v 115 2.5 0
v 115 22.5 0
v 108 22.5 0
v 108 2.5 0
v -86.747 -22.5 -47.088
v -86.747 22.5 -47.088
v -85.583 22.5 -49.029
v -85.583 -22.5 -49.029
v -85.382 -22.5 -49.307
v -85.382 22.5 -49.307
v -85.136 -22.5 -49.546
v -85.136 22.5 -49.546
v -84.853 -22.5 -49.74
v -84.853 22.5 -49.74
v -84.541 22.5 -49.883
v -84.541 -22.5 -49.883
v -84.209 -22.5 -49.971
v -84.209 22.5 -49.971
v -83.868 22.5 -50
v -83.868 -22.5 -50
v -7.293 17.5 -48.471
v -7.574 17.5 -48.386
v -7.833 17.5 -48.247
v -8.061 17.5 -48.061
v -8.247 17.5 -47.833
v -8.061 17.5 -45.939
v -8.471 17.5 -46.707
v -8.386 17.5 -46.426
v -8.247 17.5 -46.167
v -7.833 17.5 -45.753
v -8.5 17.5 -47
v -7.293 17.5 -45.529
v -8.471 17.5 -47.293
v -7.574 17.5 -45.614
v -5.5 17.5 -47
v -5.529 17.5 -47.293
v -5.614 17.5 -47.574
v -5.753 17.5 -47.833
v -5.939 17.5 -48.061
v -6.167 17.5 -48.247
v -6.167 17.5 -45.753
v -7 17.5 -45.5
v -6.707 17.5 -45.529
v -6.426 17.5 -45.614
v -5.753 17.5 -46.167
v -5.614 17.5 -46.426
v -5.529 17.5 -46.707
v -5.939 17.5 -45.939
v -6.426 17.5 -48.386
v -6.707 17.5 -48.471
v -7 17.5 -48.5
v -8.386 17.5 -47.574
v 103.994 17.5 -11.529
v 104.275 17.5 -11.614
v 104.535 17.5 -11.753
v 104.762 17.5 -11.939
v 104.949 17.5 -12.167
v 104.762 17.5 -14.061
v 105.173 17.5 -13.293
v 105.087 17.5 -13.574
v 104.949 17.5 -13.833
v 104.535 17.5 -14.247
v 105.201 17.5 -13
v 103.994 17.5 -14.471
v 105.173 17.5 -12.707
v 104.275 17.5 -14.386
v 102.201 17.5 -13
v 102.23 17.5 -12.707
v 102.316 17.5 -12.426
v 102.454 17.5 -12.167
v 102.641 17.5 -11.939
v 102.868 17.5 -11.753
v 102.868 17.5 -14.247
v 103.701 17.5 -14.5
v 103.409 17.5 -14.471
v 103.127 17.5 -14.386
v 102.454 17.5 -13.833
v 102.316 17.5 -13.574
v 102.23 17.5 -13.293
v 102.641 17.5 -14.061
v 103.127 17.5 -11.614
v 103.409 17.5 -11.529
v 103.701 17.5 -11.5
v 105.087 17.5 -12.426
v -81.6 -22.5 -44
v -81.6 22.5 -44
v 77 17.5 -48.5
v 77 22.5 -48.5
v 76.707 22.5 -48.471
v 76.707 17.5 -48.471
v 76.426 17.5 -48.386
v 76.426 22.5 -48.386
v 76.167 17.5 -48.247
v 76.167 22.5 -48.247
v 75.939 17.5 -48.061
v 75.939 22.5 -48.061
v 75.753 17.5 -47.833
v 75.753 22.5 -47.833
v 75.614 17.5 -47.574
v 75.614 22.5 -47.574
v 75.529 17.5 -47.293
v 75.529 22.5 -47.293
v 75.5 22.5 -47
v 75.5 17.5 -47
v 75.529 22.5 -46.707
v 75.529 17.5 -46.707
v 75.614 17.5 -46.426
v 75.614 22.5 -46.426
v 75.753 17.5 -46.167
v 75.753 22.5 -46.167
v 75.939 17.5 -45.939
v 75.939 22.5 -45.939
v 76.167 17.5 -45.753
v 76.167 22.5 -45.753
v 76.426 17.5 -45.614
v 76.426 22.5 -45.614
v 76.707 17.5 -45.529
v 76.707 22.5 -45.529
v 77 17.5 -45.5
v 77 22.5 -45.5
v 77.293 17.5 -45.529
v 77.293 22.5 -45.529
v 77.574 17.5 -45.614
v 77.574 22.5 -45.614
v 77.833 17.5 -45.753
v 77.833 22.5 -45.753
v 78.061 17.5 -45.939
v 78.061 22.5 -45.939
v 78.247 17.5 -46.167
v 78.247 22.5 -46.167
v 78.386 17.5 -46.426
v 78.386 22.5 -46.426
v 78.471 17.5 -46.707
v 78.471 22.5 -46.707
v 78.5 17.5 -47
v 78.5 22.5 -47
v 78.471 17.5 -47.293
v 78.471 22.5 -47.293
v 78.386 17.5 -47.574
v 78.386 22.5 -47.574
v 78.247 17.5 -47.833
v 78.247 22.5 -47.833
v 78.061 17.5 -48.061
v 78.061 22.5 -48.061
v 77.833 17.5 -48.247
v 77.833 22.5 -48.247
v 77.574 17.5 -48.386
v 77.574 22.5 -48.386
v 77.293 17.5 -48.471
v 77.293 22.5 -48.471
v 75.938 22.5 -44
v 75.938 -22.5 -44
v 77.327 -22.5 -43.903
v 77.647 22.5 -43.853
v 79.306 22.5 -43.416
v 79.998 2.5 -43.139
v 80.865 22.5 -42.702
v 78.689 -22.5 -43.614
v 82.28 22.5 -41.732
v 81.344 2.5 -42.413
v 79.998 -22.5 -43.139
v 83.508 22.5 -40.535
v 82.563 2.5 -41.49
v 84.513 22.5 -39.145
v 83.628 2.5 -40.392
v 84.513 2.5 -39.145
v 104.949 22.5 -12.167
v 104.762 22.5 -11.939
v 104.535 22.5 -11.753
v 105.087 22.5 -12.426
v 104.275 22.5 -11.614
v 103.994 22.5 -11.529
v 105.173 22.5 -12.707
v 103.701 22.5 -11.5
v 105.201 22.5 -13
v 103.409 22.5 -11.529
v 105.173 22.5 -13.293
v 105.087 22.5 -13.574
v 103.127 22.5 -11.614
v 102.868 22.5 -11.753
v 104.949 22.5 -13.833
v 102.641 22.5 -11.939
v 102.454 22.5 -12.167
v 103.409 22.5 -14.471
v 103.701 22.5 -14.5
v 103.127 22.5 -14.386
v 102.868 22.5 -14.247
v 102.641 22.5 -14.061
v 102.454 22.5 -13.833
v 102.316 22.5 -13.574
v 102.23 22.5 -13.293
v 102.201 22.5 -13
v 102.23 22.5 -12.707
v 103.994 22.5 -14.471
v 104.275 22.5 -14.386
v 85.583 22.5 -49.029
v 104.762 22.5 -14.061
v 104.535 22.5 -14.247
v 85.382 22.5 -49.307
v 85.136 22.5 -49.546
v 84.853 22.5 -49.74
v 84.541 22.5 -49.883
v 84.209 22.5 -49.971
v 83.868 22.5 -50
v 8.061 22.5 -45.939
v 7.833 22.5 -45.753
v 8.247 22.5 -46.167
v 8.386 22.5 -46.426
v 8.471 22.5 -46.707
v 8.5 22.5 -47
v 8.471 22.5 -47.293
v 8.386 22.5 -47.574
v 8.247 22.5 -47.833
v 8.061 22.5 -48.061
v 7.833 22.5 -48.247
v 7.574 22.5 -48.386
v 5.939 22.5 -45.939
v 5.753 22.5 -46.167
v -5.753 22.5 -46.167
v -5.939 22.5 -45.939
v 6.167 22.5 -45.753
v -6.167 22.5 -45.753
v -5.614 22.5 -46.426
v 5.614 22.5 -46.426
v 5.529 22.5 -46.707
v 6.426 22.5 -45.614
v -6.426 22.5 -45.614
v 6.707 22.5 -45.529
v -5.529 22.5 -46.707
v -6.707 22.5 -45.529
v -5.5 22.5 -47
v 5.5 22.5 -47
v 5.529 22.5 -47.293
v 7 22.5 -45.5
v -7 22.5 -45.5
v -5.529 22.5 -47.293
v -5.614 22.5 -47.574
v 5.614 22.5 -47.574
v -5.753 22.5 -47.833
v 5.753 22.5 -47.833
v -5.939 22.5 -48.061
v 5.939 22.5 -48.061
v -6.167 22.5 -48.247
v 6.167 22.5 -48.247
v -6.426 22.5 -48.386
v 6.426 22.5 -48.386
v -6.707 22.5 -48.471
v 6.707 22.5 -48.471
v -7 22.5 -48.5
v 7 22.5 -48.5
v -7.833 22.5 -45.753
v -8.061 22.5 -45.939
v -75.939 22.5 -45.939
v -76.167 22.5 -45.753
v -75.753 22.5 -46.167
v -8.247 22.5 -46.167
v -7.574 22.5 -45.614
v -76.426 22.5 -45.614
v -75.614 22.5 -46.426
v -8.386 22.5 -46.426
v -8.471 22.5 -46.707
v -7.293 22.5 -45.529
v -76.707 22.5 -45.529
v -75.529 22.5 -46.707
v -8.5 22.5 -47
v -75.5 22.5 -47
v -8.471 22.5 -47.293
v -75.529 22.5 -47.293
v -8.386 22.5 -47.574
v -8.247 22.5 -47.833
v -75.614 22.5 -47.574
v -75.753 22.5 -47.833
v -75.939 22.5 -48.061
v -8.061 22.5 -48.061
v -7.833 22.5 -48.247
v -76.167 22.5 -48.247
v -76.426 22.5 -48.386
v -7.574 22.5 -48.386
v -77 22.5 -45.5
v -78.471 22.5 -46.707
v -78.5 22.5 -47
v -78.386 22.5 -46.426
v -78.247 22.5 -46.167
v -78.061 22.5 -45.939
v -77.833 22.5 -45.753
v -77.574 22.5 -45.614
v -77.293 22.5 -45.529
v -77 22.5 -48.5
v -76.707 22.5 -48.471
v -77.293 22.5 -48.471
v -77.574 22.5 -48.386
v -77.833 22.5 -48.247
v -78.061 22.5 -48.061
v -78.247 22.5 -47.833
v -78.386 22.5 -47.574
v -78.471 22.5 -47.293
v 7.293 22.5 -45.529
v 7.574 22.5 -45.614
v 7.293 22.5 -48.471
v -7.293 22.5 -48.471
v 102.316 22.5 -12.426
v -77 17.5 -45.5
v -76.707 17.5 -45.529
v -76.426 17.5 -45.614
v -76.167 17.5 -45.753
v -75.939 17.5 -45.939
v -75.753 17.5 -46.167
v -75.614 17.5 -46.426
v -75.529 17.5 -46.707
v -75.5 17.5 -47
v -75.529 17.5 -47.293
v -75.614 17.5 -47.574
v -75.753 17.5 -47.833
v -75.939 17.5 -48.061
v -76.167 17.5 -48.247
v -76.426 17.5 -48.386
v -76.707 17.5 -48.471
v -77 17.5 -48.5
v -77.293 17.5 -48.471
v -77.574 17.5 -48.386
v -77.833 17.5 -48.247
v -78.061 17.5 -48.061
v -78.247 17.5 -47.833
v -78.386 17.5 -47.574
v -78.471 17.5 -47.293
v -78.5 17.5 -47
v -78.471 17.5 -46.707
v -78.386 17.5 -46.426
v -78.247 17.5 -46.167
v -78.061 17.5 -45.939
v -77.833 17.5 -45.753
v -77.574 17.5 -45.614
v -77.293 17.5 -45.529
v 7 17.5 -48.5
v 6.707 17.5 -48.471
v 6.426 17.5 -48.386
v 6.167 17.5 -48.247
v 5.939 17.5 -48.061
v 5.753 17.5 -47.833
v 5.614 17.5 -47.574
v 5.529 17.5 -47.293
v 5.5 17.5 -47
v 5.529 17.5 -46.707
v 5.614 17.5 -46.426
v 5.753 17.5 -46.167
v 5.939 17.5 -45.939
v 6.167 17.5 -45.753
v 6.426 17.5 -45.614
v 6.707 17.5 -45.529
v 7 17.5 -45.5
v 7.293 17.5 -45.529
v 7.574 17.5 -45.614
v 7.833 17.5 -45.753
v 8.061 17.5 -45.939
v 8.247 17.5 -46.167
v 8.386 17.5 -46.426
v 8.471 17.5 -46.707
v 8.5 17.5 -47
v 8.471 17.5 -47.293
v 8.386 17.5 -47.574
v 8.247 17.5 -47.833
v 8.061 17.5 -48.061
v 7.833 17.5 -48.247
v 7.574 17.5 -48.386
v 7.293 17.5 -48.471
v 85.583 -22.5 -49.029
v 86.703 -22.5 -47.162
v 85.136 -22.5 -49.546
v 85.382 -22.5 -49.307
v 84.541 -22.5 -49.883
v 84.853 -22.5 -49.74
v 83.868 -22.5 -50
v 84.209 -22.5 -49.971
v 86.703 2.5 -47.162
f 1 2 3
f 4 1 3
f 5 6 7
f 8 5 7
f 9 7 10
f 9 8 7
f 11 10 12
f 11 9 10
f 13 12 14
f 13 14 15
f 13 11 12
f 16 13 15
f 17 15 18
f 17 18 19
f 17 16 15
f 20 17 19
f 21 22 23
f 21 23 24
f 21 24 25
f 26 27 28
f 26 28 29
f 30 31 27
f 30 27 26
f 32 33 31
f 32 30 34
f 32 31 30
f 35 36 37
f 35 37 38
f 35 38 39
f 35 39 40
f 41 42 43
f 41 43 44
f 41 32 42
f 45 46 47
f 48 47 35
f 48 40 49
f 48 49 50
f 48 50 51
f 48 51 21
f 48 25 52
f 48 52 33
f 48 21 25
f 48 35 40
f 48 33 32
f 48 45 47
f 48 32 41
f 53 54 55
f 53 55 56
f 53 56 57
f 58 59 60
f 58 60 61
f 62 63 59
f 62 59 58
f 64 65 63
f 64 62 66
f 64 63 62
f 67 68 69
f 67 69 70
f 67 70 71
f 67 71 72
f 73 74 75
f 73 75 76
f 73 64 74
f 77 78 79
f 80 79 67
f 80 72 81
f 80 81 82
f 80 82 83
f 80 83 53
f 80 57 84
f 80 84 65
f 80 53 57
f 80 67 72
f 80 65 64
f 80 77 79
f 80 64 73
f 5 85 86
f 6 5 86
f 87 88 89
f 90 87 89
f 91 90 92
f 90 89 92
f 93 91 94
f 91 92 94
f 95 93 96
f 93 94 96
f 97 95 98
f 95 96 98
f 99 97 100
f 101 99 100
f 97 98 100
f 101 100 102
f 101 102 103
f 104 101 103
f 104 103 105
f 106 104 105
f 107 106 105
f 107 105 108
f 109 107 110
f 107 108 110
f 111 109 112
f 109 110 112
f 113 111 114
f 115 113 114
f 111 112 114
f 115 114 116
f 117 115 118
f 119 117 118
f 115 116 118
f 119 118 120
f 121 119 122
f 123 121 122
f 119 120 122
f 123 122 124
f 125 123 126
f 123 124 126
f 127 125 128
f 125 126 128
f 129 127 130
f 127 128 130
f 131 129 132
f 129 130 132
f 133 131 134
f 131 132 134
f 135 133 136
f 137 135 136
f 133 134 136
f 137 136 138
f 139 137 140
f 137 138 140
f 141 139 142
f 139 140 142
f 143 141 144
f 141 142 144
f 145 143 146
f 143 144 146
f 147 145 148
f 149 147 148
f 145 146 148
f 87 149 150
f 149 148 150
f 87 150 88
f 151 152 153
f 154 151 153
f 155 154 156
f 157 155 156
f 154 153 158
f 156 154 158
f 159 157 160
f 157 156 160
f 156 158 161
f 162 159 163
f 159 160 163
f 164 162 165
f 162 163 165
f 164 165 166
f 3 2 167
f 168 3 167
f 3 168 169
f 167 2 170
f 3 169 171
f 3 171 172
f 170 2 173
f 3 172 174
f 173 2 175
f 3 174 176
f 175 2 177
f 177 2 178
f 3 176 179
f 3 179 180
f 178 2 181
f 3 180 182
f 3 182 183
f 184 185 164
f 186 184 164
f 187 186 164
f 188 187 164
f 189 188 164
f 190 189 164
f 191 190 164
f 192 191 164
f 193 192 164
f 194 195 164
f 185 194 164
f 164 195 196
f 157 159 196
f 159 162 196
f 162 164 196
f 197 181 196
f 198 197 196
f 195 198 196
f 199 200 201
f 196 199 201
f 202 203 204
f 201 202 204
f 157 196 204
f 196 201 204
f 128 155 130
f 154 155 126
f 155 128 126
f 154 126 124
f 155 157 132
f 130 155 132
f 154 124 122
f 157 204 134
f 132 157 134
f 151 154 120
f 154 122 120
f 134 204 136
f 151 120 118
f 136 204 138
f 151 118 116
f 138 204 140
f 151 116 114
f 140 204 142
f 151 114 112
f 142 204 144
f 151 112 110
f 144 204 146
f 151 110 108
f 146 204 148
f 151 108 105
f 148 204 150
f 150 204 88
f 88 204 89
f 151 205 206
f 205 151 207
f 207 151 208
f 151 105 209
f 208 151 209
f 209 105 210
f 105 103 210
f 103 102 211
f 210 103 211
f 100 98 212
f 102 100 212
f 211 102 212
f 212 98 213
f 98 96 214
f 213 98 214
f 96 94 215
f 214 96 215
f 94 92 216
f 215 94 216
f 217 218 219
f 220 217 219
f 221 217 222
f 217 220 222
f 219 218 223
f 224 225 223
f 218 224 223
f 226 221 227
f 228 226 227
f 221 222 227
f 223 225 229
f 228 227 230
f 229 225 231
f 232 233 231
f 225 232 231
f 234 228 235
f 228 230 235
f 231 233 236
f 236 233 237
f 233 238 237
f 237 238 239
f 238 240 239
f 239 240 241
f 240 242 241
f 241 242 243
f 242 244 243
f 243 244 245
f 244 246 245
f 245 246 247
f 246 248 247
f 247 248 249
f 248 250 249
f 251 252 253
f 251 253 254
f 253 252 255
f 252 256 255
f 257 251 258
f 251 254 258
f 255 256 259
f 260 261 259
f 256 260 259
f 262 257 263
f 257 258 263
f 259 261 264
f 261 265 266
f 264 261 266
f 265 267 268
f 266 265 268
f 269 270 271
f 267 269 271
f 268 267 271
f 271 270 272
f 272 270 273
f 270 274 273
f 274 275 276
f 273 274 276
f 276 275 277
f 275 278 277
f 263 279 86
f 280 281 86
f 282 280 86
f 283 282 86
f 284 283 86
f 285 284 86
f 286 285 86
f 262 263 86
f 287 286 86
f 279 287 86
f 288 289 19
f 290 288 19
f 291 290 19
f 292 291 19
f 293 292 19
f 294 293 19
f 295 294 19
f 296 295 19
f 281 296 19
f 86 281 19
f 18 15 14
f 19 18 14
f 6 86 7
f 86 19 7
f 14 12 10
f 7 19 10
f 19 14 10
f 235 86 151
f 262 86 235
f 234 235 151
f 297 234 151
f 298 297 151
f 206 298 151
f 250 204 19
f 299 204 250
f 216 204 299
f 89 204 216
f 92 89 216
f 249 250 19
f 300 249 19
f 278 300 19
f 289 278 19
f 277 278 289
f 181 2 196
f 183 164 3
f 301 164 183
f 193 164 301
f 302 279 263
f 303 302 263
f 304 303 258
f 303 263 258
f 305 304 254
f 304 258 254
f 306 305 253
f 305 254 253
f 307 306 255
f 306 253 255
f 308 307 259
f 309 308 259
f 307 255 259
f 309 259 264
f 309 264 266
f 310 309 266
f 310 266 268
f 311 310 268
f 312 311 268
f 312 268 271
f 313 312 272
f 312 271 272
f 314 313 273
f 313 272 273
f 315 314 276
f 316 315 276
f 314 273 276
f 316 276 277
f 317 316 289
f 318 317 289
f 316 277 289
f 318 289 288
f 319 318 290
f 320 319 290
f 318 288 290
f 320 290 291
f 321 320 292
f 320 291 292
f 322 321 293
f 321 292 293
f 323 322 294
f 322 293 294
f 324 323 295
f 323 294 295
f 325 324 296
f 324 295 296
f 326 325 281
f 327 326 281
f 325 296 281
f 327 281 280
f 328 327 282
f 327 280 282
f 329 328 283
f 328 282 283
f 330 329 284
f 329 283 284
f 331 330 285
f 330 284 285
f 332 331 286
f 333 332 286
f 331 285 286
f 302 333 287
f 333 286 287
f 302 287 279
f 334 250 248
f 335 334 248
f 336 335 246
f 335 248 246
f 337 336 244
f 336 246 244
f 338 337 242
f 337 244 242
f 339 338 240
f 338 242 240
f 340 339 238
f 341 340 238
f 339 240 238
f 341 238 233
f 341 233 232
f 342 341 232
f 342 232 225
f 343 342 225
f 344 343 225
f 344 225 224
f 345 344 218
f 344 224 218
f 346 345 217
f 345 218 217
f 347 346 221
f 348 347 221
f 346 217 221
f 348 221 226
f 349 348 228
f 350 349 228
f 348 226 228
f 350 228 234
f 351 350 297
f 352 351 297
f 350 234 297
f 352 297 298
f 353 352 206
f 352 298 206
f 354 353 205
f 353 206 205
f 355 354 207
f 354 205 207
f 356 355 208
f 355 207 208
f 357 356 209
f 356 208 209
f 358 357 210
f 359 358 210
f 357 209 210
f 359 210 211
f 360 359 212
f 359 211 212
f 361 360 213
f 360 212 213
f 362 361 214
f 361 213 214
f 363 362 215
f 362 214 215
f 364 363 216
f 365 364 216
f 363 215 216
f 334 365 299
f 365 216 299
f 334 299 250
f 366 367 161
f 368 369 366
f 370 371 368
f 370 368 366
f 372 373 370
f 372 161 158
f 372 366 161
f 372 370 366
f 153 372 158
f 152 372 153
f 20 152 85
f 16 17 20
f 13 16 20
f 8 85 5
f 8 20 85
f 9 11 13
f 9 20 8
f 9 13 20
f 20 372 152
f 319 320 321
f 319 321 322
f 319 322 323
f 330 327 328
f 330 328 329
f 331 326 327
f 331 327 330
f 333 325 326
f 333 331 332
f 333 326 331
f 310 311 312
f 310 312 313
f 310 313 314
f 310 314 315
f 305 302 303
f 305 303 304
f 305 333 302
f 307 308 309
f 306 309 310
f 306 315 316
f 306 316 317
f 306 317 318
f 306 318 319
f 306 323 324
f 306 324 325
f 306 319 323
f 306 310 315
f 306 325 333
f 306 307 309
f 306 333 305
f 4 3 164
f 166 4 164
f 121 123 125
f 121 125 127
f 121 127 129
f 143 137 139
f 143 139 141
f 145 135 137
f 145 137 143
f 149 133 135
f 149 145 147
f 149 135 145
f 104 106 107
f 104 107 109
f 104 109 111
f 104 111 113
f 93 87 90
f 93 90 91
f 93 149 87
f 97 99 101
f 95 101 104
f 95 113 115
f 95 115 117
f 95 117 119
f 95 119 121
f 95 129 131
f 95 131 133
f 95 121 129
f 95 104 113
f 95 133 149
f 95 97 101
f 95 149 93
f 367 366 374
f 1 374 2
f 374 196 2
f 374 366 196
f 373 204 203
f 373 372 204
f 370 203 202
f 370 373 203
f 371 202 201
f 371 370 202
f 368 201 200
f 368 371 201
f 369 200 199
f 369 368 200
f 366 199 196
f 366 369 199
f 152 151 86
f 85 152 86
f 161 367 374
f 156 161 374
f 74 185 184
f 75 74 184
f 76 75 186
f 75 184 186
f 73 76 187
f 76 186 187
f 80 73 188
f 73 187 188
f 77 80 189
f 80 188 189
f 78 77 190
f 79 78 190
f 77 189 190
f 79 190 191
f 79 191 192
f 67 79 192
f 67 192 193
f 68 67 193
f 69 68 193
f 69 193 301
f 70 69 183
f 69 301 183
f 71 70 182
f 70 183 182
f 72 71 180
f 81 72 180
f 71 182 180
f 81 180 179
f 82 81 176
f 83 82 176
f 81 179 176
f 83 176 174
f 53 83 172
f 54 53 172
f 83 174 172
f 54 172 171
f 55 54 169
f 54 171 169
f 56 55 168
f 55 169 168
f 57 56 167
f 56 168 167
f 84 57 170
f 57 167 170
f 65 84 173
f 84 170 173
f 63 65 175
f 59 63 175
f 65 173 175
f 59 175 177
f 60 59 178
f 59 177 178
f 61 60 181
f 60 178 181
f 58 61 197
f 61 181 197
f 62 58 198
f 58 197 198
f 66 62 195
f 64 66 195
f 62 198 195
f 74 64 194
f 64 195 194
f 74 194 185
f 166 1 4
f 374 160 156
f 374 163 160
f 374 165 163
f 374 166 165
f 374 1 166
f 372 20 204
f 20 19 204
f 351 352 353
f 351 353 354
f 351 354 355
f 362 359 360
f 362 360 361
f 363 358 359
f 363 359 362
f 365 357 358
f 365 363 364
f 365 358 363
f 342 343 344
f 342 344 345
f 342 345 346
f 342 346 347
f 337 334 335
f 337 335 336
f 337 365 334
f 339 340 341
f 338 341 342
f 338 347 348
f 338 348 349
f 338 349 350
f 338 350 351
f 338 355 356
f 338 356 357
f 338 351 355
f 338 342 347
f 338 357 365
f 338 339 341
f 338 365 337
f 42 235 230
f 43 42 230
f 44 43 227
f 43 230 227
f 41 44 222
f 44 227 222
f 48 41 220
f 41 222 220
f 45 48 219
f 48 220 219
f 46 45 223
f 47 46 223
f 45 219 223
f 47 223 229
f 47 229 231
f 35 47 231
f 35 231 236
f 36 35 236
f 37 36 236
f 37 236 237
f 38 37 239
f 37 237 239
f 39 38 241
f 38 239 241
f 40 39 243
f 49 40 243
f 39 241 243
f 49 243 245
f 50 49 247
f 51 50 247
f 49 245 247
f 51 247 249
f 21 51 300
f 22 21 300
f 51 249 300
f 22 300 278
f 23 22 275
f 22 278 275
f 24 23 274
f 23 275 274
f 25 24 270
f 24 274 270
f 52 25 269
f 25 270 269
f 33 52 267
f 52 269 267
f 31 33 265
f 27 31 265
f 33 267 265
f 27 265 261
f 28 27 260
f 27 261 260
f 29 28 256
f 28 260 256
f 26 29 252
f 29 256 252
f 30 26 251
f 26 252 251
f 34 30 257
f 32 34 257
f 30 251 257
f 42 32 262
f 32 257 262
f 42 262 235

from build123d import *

# Parameters (mm, degrees)
BOSS_EXTRUDE1_DEPTH = 22.5
SKETCH2_R           = 1.5
CUT_EXTRUDE1_DEPTH  = 5
FILLET1_R           = 2
SKETCH4_W           = 55
SKETCH4_H           = 25
CUT_EXTRUDE3_DEPTH  = 10
SKETCH5_W           = 5
SKETCH5_H           = 5
CUT_EXTRUDE4_DEPTH  = 10
SKETCH6_W           = 60
SKETCH6_H           = 45
CUT_EXTRUDE5_DEPTH  = 10
FILLET2_R           = 10


with BuildPart() as part:
    # Sketch1 → Boss-Extrude1 (new, symmetric)
    with BuildSketch(Plane(origin=(0, 0, 0), x_dir=(1, 0, 0), z_dir=(0, 1, 0))):
        Polygon((-115, 0), (-85, 50), (85, 50), (115, 0), (108, 0), (81.6, 44), (-81.6, 44), (-108, 0), align=None)
    extrude(amount=BOSS_EXTRUDE1_DEPTH, both=True)

    # Sketch2 → Cut-Extrude1 (cut)
    with BuildSketch(Plane(origin=(0, 22.5, 0), x_dir=(1, 0, 0), z_dir=(0, 1, 0))):
        with Locations(Location((-103.701428863, 13, 0), (0, 0, 270))):
            Circle(SKETCH2_R)
        with Locations(Location((-77, 47, 0), (0, 0, 270))):
            Circle(SKETCH2_R)
        with Locations(Location((-7, 47, 0), (0, 0, 270))):
            Circle(SKETCH2_R)
        with Locations(Location((7, 47, 0), (0, 0, 90))):
            Circle(SKETCH2_R)
        with Locations(Location((77, 47, 0), (0, 0, 90))):
            Circle(SKETCH2_R)
        with Locations(Location((103.701428863, 13, 0), (0, 0, 90))):
            Circle(SKETCH2_R)
    extrude(amount=-CUT_EXTRUDE1_DEPTH, mode=Mode.SUBTRACT)

    # Fillet1
    fillet1_edges = [part.edges().sort_by_distance(p)[0] for p in [
        (-85, 0, -50),
        (85, 0, -50),
    ]]
    fillet(fillet1_edges, radius=FILLET1_R)

    # Sketch4 → Cut-Extrude3 (cut)
    with BuildSketch(Plane(origin=(84.558823529, 0, -50.735294118), x_dir=(-0.5144957554275265, 0, -0.8574929257125443), z_dir=(0.8574929257125443, 0, -0.5144957554275265))):
        with Locations((-31.667011874, -10)):
            Rectangle(SKETCH4_W, SKETCH4_H)
    extrude(amount=-CUT_EXTRUDE3_DEPTH, mode=Mode.SUBTRACT)

    # Sketch5 → Cut-Extrude4 (cut)
    with BuildSketch(Plane(origin=(-79.411764706, 0, -47.647058824), x_dir=(0.5144957554275261, 0, -0.8574929257125445), z_dir=(0.8574929257125444, 0, 0.514495755427526))):
        with Locations((-56.667011874, -20)):
            Rectangle(SKETCH5_W, SKETCH5_H)
    extrude(amount=-CUT_EXTRUDE4_DEPTH, mode=Mode.SUBTRACT)

    # Sketch6 → Cut-Extrude5 (cut)
    with BuildSketch(Plane(origin=(-79.411764706, 0, -47.647058824), x_dir=(0.5144957554275261, 0, -0.8574929257125445), z_dir=(0.8574929257125444, 0, 0.514495755427526))):
        with Locations((-34.253164912, 0)):
            Rectangle(SKETCH6_W, SKETCH6_H)
    extrude(amount=-CUT_EXTRUDE5_DEPTH, mode=Mode.SUBTRACT)

    # Fillet2
    fillet2_edges = [part.edges().sort_by_distance(p)[0] for p in [
        (81.6, 12.5, -44),
    ]]
    fillet(fillet2_edges, radius=FILLET2_R)


solid = part.part
